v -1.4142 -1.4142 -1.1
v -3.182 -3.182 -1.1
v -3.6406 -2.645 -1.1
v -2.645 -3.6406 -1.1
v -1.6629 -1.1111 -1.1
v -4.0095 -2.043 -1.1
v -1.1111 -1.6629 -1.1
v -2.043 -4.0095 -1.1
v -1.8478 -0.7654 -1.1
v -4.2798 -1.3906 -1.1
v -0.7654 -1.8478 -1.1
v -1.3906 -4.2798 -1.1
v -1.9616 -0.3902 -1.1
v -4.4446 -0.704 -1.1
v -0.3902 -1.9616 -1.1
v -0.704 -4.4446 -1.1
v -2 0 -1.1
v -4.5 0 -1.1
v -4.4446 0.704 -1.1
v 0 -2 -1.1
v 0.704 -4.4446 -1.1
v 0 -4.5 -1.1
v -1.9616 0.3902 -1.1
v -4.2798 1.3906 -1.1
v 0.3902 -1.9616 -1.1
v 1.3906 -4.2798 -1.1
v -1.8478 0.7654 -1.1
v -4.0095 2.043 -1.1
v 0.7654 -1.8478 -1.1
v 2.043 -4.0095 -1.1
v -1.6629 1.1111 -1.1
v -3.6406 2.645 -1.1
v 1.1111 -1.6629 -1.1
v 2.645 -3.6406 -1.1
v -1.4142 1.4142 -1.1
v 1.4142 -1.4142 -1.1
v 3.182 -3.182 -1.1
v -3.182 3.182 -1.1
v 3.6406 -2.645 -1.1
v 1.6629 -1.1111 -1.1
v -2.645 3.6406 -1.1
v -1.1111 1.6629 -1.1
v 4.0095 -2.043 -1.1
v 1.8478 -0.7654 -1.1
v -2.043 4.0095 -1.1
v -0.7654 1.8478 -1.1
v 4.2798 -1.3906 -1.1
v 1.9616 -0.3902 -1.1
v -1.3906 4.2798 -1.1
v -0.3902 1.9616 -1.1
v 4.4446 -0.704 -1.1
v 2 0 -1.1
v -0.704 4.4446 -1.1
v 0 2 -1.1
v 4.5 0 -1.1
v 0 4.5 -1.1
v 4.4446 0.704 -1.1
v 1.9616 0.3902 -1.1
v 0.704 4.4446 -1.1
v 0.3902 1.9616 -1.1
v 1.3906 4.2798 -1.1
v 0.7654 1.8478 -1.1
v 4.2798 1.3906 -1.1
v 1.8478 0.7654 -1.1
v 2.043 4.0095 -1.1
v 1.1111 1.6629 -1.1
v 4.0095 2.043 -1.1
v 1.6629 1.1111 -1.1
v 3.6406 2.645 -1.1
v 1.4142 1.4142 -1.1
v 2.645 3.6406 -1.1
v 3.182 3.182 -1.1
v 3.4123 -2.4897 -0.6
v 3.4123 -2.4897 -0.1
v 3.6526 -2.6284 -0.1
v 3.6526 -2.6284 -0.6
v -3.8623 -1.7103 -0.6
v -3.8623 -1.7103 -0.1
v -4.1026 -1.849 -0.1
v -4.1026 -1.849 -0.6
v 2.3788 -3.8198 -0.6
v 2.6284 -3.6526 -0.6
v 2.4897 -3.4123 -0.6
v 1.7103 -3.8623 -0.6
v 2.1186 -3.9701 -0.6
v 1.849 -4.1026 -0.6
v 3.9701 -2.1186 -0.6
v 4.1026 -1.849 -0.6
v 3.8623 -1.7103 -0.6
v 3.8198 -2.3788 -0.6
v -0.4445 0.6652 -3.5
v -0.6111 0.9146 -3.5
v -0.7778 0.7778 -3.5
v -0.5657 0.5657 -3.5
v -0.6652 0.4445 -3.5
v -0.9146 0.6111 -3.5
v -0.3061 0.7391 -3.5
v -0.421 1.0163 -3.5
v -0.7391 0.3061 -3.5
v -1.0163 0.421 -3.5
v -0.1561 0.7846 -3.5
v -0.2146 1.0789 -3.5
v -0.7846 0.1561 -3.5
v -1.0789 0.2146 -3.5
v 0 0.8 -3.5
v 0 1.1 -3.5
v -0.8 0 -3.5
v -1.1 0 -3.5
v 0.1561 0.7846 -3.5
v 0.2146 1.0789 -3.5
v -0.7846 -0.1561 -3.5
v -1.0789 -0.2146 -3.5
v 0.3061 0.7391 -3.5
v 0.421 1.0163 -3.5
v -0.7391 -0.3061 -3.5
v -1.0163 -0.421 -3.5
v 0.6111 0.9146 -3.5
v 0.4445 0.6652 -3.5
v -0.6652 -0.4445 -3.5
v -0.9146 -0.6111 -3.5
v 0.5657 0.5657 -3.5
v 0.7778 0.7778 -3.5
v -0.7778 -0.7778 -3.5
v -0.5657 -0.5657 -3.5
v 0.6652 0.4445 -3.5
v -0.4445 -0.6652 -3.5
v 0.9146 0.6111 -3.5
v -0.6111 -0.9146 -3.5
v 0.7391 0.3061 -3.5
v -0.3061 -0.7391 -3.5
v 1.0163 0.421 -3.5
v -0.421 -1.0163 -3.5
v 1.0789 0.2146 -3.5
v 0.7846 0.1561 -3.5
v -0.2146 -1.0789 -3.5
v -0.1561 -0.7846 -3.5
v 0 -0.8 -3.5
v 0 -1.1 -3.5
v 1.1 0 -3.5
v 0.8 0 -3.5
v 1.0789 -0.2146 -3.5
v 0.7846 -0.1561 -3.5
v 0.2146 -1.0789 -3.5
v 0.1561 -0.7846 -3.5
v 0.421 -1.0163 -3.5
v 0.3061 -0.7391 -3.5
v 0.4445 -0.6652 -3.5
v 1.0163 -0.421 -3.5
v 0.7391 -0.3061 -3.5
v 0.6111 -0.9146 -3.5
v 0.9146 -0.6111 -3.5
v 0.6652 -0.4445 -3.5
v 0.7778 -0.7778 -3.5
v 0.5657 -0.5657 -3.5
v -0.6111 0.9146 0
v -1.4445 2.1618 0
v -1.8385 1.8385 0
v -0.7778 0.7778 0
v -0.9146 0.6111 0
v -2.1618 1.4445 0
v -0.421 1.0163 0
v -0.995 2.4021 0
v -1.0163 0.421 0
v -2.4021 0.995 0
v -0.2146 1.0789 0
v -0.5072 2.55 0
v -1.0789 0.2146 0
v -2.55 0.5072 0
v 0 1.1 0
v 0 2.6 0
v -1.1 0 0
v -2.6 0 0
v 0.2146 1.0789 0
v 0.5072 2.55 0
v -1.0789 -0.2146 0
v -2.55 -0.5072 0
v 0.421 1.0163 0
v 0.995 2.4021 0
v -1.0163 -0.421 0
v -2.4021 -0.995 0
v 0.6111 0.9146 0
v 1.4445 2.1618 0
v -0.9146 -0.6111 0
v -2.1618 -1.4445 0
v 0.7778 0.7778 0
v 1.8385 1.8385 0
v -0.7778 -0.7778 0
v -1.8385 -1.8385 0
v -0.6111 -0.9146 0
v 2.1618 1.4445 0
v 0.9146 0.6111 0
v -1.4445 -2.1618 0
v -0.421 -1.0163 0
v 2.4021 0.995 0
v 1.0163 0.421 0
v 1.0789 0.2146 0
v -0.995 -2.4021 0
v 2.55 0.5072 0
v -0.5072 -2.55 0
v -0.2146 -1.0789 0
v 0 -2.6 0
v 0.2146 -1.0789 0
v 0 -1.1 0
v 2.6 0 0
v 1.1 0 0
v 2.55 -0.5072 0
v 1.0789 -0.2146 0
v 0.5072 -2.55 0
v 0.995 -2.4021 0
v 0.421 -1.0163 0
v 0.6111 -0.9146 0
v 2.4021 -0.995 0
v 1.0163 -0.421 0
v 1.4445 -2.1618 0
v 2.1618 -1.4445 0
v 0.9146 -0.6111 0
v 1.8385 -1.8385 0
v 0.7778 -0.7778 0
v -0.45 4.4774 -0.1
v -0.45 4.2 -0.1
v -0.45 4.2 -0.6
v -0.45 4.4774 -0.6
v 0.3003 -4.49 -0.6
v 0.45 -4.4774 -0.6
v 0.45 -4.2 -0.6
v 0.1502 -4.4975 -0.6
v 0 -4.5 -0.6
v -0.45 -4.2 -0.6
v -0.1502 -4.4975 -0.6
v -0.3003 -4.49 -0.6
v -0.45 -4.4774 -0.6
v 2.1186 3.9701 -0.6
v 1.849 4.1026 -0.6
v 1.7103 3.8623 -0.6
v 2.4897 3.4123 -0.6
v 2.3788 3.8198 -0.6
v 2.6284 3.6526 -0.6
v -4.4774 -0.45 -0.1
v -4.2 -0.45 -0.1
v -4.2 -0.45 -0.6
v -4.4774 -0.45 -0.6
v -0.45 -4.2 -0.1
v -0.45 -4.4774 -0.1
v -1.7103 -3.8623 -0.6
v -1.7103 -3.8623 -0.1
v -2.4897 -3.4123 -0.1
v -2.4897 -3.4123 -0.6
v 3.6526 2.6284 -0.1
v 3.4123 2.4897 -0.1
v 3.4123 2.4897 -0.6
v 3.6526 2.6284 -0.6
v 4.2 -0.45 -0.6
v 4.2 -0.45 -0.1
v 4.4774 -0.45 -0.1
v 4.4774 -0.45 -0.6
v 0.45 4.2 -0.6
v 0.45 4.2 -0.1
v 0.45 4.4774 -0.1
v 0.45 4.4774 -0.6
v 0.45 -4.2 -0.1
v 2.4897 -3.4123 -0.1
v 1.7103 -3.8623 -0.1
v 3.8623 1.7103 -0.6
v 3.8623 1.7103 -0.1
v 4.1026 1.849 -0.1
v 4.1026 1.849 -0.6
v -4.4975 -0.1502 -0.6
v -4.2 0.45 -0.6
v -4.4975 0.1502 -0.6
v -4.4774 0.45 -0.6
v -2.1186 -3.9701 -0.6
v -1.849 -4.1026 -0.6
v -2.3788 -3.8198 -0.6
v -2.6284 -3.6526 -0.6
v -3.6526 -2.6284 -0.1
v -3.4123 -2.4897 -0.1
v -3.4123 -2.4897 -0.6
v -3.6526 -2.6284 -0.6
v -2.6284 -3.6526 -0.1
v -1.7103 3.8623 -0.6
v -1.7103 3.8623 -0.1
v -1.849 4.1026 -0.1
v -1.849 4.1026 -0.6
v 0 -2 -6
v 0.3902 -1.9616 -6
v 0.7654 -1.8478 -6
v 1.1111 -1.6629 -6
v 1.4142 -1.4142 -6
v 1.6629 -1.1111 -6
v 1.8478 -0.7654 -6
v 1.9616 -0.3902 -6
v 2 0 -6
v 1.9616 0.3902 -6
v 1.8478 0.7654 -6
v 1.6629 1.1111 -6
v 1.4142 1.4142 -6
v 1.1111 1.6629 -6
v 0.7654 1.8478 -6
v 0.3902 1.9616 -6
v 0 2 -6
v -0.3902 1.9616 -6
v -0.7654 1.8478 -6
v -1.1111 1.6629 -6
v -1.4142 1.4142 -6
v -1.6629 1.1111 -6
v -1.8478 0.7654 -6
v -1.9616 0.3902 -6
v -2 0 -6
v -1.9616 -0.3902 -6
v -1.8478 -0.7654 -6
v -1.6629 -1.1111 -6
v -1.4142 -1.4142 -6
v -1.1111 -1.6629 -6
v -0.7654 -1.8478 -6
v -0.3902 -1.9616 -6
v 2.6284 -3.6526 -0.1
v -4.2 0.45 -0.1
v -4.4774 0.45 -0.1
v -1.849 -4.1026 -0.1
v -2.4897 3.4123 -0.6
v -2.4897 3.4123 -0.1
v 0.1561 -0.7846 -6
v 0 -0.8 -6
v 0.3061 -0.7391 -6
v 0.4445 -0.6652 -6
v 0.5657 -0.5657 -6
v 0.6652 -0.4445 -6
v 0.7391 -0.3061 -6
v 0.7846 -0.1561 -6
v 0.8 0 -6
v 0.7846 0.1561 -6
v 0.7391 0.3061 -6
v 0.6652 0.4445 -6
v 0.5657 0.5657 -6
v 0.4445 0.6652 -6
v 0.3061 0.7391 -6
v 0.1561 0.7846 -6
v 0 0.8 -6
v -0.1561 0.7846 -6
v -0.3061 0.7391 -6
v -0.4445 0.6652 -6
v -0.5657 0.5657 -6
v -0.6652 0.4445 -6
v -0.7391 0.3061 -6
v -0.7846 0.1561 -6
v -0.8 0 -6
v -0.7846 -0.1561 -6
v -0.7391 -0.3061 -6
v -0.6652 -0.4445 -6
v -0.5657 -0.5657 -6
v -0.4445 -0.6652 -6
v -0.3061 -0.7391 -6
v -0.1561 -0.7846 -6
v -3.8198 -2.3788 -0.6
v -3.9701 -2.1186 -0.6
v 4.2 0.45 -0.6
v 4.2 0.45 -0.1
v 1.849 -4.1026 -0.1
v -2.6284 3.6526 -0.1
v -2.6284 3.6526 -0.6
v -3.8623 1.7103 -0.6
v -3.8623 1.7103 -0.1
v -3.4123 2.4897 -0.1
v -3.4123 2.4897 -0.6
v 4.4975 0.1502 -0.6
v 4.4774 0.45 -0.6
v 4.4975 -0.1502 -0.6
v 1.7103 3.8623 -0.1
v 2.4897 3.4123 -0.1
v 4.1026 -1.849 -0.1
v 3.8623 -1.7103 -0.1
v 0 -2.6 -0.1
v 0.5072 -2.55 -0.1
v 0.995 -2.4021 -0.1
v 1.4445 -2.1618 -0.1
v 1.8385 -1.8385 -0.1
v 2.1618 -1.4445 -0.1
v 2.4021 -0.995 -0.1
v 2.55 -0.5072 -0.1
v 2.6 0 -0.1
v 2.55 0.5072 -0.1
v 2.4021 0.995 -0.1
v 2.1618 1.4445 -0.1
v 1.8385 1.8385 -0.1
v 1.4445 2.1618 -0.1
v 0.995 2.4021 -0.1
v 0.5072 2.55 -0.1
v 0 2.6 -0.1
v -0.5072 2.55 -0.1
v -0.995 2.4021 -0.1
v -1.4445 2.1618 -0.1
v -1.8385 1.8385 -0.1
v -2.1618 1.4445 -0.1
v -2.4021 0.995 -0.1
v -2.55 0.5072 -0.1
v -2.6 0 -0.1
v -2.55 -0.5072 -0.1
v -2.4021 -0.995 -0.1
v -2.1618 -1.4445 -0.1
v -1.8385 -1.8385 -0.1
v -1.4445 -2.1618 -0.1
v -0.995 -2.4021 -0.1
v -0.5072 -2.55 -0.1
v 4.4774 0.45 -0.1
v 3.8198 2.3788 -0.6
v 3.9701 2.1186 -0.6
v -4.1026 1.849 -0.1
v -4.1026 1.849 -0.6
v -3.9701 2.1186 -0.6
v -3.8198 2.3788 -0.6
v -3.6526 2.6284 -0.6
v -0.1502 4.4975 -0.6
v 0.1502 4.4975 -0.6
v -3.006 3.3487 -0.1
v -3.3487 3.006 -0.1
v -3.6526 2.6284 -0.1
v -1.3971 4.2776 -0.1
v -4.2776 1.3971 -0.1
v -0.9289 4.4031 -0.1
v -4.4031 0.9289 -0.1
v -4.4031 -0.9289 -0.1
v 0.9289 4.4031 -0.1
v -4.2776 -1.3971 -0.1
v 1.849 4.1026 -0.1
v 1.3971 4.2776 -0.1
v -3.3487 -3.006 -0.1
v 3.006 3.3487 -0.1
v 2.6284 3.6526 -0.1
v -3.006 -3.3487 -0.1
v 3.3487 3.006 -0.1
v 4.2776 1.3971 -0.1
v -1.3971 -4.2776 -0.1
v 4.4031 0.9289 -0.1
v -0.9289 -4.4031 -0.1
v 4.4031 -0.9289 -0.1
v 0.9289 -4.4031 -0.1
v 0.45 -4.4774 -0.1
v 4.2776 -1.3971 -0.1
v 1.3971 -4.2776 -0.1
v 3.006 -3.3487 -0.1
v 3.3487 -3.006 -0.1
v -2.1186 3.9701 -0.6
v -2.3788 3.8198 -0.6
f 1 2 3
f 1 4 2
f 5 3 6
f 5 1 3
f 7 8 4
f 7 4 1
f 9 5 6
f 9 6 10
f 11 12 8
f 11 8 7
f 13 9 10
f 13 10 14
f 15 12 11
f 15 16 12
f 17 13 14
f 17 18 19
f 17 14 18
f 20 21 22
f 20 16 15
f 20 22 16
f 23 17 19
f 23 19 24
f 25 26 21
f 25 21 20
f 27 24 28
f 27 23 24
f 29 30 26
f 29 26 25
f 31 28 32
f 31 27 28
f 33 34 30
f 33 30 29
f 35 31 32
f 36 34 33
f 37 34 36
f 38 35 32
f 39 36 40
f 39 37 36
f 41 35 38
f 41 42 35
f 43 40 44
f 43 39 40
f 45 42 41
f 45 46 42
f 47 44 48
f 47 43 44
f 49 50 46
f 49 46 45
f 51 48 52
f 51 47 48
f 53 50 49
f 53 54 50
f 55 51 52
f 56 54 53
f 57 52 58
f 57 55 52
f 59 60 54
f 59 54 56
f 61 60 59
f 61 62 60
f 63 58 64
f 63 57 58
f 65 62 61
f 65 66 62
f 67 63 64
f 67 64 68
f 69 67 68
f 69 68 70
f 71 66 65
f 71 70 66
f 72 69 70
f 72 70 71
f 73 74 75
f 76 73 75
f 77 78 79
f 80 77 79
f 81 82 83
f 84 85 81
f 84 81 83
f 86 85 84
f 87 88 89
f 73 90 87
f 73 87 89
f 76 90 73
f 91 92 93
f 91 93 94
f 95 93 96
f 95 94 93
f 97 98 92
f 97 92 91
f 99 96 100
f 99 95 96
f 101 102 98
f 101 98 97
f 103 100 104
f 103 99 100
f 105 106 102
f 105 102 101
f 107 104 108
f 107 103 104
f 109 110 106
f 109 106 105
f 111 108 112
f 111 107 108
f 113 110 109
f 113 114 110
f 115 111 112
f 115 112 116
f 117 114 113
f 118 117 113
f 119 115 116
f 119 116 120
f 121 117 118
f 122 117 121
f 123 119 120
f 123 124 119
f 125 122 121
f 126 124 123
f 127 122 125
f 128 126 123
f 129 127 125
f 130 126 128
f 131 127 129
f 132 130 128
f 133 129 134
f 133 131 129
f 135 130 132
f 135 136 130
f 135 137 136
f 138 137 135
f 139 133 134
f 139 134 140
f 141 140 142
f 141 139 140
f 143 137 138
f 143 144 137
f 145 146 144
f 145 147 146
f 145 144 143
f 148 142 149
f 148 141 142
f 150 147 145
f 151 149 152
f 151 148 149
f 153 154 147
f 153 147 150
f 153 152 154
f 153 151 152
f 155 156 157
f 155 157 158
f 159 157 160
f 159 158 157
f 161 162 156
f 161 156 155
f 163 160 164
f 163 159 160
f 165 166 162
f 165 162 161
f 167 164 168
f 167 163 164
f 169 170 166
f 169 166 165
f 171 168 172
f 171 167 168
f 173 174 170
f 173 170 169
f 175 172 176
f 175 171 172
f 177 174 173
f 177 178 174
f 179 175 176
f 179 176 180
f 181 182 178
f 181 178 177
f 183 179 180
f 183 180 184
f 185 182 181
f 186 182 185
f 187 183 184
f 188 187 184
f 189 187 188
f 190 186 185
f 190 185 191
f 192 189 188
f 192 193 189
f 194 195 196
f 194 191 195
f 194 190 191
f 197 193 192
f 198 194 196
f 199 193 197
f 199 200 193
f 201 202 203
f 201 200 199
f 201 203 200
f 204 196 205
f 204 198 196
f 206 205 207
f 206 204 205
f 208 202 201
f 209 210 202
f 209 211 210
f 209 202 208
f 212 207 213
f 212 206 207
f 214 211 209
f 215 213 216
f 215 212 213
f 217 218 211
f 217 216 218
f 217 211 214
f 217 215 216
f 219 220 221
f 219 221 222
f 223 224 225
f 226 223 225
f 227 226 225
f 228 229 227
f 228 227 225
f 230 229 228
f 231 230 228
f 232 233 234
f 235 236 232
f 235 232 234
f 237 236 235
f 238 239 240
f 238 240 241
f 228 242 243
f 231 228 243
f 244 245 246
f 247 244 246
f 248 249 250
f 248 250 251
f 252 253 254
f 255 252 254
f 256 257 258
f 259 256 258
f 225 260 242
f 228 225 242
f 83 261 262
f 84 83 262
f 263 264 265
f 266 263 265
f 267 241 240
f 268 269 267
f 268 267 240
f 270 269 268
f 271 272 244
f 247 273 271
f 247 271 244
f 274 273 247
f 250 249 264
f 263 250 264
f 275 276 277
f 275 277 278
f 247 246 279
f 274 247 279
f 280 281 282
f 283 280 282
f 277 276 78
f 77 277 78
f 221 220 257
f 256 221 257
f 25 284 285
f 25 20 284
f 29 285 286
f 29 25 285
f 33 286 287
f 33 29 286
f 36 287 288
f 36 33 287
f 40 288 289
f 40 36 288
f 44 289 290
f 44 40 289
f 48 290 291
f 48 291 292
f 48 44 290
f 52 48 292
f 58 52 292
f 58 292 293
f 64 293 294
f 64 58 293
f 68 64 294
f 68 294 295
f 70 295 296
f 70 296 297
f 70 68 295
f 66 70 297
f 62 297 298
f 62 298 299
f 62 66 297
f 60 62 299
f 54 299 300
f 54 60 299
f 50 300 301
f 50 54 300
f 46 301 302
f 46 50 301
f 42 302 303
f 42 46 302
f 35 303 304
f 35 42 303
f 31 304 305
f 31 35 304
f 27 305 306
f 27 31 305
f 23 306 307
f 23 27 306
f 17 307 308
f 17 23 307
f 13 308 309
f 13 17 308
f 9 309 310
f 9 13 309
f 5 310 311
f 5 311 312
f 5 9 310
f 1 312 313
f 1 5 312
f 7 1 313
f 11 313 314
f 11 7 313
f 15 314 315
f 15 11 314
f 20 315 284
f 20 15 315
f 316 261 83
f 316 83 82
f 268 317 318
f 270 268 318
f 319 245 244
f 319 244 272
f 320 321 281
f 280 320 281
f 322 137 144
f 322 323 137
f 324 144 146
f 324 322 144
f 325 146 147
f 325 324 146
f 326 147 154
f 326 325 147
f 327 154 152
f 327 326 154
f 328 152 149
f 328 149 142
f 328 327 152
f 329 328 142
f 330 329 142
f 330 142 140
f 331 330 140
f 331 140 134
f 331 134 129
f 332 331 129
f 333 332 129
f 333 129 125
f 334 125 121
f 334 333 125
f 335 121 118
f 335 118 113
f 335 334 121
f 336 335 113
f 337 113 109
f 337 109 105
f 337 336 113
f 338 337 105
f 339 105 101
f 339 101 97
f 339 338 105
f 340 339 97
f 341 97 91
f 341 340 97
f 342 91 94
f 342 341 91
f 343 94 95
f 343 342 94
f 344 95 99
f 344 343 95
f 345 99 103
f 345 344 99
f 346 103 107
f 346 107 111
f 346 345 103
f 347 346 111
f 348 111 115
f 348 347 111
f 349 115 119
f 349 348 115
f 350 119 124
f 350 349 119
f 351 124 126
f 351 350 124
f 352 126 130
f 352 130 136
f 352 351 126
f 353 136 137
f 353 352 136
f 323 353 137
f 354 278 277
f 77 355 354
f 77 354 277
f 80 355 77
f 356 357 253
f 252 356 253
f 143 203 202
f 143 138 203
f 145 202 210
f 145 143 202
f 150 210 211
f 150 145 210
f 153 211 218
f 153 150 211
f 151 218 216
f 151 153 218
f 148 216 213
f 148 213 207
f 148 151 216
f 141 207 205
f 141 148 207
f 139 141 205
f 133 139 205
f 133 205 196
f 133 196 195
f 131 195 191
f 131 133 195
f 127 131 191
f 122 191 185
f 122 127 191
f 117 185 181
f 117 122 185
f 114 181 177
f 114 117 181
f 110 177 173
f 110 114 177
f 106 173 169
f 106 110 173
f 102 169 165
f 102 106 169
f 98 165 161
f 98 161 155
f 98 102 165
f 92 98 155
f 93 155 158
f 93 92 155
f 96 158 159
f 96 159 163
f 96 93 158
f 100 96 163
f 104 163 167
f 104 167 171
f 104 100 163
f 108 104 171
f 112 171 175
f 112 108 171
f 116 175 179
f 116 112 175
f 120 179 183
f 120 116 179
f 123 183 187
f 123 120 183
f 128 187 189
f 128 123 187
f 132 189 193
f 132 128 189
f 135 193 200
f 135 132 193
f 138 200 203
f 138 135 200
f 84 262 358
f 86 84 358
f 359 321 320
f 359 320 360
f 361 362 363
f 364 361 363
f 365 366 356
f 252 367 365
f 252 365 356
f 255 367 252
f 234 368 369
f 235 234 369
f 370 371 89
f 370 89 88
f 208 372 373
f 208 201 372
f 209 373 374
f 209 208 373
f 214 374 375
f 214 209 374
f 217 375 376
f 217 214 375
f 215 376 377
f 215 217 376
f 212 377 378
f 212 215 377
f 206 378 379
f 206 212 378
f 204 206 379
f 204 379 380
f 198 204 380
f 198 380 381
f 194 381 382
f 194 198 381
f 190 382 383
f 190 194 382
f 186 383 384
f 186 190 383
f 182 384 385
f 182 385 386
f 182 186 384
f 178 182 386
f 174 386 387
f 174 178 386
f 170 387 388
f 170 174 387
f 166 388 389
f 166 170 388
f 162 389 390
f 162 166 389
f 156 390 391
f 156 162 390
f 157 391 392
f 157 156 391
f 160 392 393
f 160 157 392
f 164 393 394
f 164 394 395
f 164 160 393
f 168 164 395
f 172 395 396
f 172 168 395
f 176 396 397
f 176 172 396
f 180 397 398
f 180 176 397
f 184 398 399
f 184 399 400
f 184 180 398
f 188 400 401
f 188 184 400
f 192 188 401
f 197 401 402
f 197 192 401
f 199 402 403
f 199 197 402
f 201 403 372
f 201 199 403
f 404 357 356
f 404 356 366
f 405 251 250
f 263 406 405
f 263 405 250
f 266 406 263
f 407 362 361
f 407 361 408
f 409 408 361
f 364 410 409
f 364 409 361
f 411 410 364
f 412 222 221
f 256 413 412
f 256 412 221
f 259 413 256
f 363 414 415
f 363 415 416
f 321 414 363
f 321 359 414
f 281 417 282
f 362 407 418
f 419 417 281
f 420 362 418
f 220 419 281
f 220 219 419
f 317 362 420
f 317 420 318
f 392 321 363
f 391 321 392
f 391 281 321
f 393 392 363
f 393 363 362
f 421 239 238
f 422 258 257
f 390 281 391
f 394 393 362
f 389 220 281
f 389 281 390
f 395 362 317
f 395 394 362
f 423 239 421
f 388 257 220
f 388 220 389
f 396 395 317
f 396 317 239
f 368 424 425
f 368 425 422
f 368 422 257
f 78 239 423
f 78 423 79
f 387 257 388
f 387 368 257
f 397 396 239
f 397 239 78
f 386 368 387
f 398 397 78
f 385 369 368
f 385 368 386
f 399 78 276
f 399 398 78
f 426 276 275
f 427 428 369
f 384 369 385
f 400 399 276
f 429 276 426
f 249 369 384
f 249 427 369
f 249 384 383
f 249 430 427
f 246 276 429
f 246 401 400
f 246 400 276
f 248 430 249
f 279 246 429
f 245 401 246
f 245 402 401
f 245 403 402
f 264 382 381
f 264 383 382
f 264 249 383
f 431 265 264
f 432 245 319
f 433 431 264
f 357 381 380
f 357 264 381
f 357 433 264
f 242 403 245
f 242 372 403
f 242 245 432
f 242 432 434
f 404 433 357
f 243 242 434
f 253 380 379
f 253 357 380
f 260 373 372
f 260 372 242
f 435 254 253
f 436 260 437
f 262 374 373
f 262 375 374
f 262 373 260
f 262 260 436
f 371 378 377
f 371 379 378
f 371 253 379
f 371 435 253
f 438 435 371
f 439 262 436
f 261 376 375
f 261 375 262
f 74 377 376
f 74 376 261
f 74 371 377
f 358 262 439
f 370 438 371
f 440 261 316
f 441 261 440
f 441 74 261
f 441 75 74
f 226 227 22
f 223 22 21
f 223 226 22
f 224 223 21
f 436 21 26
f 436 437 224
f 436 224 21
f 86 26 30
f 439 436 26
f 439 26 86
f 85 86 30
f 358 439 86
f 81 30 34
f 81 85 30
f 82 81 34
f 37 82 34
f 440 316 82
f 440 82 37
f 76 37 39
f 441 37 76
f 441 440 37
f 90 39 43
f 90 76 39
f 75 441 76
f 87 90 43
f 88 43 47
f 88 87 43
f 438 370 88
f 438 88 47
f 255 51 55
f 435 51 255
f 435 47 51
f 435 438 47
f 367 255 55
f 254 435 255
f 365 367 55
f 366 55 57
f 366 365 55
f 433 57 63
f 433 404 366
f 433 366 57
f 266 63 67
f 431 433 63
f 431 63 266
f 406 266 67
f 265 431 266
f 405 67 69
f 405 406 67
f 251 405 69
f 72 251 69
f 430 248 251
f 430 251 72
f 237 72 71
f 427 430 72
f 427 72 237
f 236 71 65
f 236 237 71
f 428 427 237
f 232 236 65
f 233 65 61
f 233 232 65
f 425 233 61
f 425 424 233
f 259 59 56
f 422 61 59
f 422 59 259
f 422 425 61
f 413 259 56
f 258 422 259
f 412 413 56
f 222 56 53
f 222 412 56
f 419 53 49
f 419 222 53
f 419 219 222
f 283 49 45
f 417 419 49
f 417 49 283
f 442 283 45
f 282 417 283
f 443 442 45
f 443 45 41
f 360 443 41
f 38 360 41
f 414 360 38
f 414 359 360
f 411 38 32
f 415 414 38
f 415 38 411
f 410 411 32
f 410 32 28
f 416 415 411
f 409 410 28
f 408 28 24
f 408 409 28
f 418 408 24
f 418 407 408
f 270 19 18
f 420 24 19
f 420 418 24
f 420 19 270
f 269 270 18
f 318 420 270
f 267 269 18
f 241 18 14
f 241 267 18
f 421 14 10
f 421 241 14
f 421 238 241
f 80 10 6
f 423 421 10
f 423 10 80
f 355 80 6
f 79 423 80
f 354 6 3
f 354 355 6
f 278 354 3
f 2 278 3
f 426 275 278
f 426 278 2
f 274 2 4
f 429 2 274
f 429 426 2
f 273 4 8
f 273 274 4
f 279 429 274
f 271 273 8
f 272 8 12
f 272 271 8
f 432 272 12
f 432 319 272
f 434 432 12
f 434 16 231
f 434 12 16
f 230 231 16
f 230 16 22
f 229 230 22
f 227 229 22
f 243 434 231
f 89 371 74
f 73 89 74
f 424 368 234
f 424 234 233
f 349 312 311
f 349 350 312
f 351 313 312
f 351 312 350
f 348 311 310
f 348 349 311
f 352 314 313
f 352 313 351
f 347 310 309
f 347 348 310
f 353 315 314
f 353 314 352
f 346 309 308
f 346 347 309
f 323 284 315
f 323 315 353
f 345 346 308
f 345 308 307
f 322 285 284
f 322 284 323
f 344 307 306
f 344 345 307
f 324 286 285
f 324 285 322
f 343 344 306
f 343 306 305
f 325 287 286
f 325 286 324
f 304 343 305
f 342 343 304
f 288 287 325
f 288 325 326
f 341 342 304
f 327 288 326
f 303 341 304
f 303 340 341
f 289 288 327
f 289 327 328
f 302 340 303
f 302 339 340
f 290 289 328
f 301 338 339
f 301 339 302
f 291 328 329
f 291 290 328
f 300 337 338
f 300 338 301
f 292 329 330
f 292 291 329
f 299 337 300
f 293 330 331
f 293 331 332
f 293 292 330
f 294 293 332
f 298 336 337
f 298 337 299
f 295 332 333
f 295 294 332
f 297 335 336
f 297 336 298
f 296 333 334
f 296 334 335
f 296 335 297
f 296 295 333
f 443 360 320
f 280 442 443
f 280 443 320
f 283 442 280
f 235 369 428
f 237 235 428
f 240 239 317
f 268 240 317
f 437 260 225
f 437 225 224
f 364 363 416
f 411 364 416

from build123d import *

# Parameters (mm, degrees)
SKETCH001_W        = 0.9
SKETCH001_H        = 0.3
POCKET_DEPTH       = 0.5
POLARPATTERN_COUNT = 12


with BuildPart() as part:
    # Sketch → Revolution (revolve)
    with BuildSketch(Plane.YZ):
        Polygon((-0.8, -6), (-2, -6), (-2, -1.1), (-4.5, -1.1), (-4.5, -0.1), (-2.6, -0.1), (-2.6, 0), (-1.1, 0), (-1.1, -3.5), (-0.8, -3.5), align=None)
    revolve(axis=Axis((0, 0, 0), (0, 0, 1)))

    # Sketch001 (on Face5 of Revolution) → Pocket (cut)
    with BuildSketch(Plane(origin=(0, 0, -0.1), x_dir=(0, -1, 0), z_dir=(0, 0, 1))):
        with Locations((0, 4.35)):
            Rectangle(SKETCH001_W, SKETCH001_H)
    pocket = extrude(amount=-POCKET_DEPTH, mode=Mode.SUBTRACT)

    # PolarPattern: Pocket ×12 about axis
    polarpattern_axis = Axis((0, 0, -0.1), (0, 0, 1))
    for i in range(1, POLARPATTERN_COUNT):
        add(pocket.rotate(polarpattern_axis, i * 360 / POLARPATTERN_COUNT), mode=Mode.SUBTRACT)


solid = part.part
